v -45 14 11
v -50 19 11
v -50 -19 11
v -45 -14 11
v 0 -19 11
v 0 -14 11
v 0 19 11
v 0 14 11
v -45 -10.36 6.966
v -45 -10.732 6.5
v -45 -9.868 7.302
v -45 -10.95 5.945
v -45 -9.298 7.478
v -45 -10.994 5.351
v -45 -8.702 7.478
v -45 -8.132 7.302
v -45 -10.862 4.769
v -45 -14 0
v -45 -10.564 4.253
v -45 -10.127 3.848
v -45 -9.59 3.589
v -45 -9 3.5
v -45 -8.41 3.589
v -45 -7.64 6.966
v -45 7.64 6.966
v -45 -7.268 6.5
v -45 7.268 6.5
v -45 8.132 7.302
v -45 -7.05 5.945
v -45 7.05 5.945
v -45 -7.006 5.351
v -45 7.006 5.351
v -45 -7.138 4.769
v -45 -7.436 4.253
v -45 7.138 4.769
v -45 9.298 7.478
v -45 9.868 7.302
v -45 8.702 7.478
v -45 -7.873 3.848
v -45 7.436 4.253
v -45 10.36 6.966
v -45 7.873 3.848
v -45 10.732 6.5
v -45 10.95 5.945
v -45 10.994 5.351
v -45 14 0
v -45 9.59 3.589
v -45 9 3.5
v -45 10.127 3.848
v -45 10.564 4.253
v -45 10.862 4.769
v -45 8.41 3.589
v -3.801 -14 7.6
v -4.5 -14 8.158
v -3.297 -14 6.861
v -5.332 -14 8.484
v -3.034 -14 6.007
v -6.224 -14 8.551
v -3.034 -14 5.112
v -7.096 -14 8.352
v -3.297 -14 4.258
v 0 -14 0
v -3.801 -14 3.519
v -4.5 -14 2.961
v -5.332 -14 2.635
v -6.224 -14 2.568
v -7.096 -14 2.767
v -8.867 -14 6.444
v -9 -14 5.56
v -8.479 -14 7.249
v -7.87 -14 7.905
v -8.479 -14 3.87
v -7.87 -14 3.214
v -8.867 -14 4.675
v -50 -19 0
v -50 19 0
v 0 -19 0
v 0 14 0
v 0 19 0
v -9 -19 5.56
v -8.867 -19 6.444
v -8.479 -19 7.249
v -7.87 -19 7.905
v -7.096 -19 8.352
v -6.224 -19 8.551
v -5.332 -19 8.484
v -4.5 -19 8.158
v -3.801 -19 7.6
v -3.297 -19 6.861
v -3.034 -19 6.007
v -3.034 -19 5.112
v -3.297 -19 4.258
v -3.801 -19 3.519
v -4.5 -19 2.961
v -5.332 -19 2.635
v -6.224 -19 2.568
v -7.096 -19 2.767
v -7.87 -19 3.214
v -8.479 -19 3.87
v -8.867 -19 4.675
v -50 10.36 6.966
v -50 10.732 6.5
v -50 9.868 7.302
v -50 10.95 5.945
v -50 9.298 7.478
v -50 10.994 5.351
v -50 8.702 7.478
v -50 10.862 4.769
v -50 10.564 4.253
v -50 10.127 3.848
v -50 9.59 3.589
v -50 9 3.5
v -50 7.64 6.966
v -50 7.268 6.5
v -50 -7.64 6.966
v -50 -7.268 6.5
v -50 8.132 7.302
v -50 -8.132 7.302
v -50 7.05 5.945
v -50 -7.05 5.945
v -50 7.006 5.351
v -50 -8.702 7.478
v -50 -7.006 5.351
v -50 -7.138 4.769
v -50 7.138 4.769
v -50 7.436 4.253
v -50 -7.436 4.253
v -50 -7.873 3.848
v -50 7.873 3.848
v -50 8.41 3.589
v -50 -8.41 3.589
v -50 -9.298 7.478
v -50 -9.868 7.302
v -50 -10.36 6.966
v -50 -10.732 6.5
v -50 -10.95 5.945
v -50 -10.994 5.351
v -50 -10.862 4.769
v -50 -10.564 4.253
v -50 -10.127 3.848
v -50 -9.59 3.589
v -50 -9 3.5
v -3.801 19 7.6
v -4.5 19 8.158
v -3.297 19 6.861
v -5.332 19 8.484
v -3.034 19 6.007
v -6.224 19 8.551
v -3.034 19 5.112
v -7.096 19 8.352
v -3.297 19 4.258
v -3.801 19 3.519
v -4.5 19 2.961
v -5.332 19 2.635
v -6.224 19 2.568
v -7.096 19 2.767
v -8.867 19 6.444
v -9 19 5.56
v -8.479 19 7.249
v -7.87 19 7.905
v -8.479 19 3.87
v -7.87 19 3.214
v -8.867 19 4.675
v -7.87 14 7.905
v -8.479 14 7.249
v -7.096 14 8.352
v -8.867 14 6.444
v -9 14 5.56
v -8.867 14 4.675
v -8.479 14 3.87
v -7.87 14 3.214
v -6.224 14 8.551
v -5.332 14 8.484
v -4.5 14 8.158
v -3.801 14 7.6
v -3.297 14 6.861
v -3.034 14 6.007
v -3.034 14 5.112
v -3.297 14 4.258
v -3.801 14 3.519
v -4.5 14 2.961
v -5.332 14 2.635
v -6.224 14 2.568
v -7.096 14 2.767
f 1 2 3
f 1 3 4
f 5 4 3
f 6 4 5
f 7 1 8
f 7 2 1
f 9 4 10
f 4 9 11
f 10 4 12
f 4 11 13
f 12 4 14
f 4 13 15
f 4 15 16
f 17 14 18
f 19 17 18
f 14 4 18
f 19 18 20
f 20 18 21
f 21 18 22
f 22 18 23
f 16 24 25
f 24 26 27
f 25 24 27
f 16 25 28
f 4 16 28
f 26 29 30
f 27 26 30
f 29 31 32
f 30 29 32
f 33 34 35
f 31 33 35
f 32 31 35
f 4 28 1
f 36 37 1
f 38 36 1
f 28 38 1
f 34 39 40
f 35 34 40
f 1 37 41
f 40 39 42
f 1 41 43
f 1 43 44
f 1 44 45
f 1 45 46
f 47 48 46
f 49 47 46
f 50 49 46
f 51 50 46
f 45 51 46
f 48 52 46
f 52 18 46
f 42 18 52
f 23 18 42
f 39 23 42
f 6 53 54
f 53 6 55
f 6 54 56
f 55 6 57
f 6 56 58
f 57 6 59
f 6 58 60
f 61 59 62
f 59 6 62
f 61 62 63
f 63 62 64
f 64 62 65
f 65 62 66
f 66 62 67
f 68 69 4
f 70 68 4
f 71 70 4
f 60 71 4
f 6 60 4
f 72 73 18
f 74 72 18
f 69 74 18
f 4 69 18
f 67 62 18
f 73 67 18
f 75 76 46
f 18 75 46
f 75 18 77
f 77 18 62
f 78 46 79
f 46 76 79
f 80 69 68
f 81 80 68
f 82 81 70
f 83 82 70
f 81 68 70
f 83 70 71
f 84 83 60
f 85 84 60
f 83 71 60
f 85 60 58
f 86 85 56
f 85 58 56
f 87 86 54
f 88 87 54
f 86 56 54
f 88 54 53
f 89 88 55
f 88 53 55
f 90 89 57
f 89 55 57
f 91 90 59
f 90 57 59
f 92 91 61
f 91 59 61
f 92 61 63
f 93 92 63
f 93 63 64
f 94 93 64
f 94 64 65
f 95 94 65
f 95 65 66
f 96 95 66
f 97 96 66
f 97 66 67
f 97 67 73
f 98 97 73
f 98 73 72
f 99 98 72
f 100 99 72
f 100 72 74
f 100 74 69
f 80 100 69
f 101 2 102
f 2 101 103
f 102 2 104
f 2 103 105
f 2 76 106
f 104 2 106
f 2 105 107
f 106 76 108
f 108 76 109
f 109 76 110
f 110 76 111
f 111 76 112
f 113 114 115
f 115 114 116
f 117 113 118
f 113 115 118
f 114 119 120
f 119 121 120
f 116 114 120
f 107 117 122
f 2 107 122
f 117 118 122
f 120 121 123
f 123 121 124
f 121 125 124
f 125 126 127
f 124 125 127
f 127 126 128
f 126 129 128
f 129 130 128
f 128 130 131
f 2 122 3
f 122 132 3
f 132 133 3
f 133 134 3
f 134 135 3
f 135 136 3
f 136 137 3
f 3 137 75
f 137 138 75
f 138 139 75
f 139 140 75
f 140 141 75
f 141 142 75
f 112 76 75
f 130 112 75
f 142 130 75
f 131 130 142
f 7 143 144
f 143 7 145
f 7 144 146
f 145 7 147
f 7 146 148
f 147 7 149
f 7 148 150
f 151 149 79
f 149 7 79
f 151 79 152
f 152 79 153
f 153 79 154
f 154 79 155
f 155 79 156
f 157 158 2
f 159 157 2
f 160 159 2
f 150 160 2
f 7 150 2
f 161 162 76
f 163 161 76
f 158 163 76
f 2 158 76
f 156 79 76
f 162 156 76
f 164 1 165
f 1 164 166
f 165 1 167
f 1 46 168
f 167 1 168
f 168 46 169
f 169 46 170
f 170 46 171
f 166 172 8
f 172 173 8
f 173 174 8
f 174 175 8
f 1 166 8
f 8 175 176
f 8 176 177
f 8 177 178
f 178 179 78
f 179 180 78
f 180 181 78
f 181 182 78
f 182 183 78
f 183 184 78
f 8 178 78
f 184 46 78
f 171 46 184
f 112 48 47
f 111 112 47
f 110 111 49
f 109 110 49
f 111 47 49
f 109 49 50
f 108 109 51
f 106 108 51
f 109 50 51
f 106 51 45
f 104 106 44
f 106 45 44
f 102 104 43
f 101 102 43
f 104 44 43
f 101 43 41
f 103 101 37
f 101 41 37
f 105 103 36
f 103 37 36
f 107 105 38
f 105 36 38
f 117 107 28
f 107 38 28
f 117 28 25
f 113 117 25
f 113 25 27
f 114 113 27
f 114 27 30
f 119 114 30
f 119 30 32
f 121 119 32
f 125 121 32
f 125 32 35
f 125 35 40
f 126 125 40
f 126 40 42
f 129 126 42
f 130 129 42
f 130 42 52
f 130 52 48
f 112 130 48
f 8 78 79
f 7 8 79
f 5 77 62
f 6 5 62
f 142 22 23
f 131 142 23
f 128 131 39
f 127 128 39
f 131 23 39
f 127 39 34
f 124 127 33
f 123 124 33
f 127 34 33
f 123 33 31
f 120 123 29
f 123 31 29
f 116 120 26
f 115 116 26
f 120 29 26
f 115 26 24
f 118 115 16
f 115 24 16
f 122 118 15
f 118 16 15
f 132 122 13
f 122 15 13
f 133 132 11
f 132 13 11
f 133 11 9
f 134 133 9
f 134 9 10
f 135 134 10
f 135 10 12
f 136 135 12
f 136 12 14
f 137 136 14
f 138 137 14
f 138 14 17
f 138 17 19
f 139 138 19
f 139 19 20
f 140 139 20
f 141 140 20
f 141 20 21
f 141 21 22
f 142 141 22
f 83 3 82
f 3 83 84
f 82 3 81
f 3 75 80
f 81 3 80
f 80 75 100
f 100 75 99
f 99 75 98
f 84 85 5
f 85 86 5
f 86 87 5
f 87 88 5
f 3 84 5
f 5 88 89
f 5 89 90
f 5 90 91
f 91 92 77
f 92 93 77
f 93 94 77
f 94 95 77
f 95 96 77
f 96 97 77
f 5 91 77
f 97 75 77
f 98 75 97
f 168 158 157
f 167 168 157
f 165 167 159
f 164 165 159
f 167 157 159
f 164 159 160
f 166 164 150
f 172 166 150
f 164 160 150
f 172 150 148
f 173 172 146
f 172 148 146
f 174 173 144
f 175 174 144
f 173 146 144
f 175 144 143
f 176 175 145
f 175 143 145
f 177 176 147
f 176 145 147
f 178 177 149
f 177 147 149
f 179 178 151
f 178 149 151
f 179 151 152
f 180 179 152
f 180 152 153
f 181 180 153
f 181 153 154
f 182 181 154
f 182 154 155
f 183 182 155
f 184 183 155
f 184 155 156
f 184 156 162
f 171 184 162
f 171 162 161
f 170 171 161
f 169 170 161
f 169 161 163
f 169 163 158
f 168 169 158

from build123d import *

# Parameters (mm, degrees)
BOSS_EXTRUDE1_DEPTH = 11
SKETCH3_R           = 3
CUT_EXTRUDE1_DEPTH  = 50
SKETCH4_R           = 2
CUT_EXTRUDE2_DEPTH  = 10


with BuildPart() as part:
    # Sketch2 → Boss-Extrude1 (new body)
    with BuildSketch(Plane.XY):
        Polygon((0, 19), (-50, 19), (-50, -19), (0, -19), (0, -14), (-45, -14), (-45, 14), (0, 14), align=None)
    extrude(amount=BOSS_EXTRUDE1_DEPTH)

    # Sketch3 → Cut-Extrude1 (cut)
    with BuildSketch(Plane(origin=(0, 19, 0), x_dir=(1, 0, 0), z_dir=(0, 1, 0))):
        with Locations(Location((-6, -5.559501776, 0), (0, 0, 180))):
            Circle(SKETCH3_R)
    extrude(amount=-CUT_EXTRUDE1_DEPTH, mode=Mode.SUBTRACT)

    # Sketch4 → Cut-Extrude2 (cut)
    with BuildSketch(Plane(origin=(-45, 0, 0), x_dir=(0, 0, -1), z_dir=(1, 0, 0))):
        with Locations((-5.5, 9)):
            Circle(SKETCH4_R)
        with Locations((-5.5, -9)):
            Circle(SKETCH4_R)
    extrude(amount=-CUT_EXTRUDE2_DEPTH, mode=Mode.SUBTRACT)


solid = part.part
